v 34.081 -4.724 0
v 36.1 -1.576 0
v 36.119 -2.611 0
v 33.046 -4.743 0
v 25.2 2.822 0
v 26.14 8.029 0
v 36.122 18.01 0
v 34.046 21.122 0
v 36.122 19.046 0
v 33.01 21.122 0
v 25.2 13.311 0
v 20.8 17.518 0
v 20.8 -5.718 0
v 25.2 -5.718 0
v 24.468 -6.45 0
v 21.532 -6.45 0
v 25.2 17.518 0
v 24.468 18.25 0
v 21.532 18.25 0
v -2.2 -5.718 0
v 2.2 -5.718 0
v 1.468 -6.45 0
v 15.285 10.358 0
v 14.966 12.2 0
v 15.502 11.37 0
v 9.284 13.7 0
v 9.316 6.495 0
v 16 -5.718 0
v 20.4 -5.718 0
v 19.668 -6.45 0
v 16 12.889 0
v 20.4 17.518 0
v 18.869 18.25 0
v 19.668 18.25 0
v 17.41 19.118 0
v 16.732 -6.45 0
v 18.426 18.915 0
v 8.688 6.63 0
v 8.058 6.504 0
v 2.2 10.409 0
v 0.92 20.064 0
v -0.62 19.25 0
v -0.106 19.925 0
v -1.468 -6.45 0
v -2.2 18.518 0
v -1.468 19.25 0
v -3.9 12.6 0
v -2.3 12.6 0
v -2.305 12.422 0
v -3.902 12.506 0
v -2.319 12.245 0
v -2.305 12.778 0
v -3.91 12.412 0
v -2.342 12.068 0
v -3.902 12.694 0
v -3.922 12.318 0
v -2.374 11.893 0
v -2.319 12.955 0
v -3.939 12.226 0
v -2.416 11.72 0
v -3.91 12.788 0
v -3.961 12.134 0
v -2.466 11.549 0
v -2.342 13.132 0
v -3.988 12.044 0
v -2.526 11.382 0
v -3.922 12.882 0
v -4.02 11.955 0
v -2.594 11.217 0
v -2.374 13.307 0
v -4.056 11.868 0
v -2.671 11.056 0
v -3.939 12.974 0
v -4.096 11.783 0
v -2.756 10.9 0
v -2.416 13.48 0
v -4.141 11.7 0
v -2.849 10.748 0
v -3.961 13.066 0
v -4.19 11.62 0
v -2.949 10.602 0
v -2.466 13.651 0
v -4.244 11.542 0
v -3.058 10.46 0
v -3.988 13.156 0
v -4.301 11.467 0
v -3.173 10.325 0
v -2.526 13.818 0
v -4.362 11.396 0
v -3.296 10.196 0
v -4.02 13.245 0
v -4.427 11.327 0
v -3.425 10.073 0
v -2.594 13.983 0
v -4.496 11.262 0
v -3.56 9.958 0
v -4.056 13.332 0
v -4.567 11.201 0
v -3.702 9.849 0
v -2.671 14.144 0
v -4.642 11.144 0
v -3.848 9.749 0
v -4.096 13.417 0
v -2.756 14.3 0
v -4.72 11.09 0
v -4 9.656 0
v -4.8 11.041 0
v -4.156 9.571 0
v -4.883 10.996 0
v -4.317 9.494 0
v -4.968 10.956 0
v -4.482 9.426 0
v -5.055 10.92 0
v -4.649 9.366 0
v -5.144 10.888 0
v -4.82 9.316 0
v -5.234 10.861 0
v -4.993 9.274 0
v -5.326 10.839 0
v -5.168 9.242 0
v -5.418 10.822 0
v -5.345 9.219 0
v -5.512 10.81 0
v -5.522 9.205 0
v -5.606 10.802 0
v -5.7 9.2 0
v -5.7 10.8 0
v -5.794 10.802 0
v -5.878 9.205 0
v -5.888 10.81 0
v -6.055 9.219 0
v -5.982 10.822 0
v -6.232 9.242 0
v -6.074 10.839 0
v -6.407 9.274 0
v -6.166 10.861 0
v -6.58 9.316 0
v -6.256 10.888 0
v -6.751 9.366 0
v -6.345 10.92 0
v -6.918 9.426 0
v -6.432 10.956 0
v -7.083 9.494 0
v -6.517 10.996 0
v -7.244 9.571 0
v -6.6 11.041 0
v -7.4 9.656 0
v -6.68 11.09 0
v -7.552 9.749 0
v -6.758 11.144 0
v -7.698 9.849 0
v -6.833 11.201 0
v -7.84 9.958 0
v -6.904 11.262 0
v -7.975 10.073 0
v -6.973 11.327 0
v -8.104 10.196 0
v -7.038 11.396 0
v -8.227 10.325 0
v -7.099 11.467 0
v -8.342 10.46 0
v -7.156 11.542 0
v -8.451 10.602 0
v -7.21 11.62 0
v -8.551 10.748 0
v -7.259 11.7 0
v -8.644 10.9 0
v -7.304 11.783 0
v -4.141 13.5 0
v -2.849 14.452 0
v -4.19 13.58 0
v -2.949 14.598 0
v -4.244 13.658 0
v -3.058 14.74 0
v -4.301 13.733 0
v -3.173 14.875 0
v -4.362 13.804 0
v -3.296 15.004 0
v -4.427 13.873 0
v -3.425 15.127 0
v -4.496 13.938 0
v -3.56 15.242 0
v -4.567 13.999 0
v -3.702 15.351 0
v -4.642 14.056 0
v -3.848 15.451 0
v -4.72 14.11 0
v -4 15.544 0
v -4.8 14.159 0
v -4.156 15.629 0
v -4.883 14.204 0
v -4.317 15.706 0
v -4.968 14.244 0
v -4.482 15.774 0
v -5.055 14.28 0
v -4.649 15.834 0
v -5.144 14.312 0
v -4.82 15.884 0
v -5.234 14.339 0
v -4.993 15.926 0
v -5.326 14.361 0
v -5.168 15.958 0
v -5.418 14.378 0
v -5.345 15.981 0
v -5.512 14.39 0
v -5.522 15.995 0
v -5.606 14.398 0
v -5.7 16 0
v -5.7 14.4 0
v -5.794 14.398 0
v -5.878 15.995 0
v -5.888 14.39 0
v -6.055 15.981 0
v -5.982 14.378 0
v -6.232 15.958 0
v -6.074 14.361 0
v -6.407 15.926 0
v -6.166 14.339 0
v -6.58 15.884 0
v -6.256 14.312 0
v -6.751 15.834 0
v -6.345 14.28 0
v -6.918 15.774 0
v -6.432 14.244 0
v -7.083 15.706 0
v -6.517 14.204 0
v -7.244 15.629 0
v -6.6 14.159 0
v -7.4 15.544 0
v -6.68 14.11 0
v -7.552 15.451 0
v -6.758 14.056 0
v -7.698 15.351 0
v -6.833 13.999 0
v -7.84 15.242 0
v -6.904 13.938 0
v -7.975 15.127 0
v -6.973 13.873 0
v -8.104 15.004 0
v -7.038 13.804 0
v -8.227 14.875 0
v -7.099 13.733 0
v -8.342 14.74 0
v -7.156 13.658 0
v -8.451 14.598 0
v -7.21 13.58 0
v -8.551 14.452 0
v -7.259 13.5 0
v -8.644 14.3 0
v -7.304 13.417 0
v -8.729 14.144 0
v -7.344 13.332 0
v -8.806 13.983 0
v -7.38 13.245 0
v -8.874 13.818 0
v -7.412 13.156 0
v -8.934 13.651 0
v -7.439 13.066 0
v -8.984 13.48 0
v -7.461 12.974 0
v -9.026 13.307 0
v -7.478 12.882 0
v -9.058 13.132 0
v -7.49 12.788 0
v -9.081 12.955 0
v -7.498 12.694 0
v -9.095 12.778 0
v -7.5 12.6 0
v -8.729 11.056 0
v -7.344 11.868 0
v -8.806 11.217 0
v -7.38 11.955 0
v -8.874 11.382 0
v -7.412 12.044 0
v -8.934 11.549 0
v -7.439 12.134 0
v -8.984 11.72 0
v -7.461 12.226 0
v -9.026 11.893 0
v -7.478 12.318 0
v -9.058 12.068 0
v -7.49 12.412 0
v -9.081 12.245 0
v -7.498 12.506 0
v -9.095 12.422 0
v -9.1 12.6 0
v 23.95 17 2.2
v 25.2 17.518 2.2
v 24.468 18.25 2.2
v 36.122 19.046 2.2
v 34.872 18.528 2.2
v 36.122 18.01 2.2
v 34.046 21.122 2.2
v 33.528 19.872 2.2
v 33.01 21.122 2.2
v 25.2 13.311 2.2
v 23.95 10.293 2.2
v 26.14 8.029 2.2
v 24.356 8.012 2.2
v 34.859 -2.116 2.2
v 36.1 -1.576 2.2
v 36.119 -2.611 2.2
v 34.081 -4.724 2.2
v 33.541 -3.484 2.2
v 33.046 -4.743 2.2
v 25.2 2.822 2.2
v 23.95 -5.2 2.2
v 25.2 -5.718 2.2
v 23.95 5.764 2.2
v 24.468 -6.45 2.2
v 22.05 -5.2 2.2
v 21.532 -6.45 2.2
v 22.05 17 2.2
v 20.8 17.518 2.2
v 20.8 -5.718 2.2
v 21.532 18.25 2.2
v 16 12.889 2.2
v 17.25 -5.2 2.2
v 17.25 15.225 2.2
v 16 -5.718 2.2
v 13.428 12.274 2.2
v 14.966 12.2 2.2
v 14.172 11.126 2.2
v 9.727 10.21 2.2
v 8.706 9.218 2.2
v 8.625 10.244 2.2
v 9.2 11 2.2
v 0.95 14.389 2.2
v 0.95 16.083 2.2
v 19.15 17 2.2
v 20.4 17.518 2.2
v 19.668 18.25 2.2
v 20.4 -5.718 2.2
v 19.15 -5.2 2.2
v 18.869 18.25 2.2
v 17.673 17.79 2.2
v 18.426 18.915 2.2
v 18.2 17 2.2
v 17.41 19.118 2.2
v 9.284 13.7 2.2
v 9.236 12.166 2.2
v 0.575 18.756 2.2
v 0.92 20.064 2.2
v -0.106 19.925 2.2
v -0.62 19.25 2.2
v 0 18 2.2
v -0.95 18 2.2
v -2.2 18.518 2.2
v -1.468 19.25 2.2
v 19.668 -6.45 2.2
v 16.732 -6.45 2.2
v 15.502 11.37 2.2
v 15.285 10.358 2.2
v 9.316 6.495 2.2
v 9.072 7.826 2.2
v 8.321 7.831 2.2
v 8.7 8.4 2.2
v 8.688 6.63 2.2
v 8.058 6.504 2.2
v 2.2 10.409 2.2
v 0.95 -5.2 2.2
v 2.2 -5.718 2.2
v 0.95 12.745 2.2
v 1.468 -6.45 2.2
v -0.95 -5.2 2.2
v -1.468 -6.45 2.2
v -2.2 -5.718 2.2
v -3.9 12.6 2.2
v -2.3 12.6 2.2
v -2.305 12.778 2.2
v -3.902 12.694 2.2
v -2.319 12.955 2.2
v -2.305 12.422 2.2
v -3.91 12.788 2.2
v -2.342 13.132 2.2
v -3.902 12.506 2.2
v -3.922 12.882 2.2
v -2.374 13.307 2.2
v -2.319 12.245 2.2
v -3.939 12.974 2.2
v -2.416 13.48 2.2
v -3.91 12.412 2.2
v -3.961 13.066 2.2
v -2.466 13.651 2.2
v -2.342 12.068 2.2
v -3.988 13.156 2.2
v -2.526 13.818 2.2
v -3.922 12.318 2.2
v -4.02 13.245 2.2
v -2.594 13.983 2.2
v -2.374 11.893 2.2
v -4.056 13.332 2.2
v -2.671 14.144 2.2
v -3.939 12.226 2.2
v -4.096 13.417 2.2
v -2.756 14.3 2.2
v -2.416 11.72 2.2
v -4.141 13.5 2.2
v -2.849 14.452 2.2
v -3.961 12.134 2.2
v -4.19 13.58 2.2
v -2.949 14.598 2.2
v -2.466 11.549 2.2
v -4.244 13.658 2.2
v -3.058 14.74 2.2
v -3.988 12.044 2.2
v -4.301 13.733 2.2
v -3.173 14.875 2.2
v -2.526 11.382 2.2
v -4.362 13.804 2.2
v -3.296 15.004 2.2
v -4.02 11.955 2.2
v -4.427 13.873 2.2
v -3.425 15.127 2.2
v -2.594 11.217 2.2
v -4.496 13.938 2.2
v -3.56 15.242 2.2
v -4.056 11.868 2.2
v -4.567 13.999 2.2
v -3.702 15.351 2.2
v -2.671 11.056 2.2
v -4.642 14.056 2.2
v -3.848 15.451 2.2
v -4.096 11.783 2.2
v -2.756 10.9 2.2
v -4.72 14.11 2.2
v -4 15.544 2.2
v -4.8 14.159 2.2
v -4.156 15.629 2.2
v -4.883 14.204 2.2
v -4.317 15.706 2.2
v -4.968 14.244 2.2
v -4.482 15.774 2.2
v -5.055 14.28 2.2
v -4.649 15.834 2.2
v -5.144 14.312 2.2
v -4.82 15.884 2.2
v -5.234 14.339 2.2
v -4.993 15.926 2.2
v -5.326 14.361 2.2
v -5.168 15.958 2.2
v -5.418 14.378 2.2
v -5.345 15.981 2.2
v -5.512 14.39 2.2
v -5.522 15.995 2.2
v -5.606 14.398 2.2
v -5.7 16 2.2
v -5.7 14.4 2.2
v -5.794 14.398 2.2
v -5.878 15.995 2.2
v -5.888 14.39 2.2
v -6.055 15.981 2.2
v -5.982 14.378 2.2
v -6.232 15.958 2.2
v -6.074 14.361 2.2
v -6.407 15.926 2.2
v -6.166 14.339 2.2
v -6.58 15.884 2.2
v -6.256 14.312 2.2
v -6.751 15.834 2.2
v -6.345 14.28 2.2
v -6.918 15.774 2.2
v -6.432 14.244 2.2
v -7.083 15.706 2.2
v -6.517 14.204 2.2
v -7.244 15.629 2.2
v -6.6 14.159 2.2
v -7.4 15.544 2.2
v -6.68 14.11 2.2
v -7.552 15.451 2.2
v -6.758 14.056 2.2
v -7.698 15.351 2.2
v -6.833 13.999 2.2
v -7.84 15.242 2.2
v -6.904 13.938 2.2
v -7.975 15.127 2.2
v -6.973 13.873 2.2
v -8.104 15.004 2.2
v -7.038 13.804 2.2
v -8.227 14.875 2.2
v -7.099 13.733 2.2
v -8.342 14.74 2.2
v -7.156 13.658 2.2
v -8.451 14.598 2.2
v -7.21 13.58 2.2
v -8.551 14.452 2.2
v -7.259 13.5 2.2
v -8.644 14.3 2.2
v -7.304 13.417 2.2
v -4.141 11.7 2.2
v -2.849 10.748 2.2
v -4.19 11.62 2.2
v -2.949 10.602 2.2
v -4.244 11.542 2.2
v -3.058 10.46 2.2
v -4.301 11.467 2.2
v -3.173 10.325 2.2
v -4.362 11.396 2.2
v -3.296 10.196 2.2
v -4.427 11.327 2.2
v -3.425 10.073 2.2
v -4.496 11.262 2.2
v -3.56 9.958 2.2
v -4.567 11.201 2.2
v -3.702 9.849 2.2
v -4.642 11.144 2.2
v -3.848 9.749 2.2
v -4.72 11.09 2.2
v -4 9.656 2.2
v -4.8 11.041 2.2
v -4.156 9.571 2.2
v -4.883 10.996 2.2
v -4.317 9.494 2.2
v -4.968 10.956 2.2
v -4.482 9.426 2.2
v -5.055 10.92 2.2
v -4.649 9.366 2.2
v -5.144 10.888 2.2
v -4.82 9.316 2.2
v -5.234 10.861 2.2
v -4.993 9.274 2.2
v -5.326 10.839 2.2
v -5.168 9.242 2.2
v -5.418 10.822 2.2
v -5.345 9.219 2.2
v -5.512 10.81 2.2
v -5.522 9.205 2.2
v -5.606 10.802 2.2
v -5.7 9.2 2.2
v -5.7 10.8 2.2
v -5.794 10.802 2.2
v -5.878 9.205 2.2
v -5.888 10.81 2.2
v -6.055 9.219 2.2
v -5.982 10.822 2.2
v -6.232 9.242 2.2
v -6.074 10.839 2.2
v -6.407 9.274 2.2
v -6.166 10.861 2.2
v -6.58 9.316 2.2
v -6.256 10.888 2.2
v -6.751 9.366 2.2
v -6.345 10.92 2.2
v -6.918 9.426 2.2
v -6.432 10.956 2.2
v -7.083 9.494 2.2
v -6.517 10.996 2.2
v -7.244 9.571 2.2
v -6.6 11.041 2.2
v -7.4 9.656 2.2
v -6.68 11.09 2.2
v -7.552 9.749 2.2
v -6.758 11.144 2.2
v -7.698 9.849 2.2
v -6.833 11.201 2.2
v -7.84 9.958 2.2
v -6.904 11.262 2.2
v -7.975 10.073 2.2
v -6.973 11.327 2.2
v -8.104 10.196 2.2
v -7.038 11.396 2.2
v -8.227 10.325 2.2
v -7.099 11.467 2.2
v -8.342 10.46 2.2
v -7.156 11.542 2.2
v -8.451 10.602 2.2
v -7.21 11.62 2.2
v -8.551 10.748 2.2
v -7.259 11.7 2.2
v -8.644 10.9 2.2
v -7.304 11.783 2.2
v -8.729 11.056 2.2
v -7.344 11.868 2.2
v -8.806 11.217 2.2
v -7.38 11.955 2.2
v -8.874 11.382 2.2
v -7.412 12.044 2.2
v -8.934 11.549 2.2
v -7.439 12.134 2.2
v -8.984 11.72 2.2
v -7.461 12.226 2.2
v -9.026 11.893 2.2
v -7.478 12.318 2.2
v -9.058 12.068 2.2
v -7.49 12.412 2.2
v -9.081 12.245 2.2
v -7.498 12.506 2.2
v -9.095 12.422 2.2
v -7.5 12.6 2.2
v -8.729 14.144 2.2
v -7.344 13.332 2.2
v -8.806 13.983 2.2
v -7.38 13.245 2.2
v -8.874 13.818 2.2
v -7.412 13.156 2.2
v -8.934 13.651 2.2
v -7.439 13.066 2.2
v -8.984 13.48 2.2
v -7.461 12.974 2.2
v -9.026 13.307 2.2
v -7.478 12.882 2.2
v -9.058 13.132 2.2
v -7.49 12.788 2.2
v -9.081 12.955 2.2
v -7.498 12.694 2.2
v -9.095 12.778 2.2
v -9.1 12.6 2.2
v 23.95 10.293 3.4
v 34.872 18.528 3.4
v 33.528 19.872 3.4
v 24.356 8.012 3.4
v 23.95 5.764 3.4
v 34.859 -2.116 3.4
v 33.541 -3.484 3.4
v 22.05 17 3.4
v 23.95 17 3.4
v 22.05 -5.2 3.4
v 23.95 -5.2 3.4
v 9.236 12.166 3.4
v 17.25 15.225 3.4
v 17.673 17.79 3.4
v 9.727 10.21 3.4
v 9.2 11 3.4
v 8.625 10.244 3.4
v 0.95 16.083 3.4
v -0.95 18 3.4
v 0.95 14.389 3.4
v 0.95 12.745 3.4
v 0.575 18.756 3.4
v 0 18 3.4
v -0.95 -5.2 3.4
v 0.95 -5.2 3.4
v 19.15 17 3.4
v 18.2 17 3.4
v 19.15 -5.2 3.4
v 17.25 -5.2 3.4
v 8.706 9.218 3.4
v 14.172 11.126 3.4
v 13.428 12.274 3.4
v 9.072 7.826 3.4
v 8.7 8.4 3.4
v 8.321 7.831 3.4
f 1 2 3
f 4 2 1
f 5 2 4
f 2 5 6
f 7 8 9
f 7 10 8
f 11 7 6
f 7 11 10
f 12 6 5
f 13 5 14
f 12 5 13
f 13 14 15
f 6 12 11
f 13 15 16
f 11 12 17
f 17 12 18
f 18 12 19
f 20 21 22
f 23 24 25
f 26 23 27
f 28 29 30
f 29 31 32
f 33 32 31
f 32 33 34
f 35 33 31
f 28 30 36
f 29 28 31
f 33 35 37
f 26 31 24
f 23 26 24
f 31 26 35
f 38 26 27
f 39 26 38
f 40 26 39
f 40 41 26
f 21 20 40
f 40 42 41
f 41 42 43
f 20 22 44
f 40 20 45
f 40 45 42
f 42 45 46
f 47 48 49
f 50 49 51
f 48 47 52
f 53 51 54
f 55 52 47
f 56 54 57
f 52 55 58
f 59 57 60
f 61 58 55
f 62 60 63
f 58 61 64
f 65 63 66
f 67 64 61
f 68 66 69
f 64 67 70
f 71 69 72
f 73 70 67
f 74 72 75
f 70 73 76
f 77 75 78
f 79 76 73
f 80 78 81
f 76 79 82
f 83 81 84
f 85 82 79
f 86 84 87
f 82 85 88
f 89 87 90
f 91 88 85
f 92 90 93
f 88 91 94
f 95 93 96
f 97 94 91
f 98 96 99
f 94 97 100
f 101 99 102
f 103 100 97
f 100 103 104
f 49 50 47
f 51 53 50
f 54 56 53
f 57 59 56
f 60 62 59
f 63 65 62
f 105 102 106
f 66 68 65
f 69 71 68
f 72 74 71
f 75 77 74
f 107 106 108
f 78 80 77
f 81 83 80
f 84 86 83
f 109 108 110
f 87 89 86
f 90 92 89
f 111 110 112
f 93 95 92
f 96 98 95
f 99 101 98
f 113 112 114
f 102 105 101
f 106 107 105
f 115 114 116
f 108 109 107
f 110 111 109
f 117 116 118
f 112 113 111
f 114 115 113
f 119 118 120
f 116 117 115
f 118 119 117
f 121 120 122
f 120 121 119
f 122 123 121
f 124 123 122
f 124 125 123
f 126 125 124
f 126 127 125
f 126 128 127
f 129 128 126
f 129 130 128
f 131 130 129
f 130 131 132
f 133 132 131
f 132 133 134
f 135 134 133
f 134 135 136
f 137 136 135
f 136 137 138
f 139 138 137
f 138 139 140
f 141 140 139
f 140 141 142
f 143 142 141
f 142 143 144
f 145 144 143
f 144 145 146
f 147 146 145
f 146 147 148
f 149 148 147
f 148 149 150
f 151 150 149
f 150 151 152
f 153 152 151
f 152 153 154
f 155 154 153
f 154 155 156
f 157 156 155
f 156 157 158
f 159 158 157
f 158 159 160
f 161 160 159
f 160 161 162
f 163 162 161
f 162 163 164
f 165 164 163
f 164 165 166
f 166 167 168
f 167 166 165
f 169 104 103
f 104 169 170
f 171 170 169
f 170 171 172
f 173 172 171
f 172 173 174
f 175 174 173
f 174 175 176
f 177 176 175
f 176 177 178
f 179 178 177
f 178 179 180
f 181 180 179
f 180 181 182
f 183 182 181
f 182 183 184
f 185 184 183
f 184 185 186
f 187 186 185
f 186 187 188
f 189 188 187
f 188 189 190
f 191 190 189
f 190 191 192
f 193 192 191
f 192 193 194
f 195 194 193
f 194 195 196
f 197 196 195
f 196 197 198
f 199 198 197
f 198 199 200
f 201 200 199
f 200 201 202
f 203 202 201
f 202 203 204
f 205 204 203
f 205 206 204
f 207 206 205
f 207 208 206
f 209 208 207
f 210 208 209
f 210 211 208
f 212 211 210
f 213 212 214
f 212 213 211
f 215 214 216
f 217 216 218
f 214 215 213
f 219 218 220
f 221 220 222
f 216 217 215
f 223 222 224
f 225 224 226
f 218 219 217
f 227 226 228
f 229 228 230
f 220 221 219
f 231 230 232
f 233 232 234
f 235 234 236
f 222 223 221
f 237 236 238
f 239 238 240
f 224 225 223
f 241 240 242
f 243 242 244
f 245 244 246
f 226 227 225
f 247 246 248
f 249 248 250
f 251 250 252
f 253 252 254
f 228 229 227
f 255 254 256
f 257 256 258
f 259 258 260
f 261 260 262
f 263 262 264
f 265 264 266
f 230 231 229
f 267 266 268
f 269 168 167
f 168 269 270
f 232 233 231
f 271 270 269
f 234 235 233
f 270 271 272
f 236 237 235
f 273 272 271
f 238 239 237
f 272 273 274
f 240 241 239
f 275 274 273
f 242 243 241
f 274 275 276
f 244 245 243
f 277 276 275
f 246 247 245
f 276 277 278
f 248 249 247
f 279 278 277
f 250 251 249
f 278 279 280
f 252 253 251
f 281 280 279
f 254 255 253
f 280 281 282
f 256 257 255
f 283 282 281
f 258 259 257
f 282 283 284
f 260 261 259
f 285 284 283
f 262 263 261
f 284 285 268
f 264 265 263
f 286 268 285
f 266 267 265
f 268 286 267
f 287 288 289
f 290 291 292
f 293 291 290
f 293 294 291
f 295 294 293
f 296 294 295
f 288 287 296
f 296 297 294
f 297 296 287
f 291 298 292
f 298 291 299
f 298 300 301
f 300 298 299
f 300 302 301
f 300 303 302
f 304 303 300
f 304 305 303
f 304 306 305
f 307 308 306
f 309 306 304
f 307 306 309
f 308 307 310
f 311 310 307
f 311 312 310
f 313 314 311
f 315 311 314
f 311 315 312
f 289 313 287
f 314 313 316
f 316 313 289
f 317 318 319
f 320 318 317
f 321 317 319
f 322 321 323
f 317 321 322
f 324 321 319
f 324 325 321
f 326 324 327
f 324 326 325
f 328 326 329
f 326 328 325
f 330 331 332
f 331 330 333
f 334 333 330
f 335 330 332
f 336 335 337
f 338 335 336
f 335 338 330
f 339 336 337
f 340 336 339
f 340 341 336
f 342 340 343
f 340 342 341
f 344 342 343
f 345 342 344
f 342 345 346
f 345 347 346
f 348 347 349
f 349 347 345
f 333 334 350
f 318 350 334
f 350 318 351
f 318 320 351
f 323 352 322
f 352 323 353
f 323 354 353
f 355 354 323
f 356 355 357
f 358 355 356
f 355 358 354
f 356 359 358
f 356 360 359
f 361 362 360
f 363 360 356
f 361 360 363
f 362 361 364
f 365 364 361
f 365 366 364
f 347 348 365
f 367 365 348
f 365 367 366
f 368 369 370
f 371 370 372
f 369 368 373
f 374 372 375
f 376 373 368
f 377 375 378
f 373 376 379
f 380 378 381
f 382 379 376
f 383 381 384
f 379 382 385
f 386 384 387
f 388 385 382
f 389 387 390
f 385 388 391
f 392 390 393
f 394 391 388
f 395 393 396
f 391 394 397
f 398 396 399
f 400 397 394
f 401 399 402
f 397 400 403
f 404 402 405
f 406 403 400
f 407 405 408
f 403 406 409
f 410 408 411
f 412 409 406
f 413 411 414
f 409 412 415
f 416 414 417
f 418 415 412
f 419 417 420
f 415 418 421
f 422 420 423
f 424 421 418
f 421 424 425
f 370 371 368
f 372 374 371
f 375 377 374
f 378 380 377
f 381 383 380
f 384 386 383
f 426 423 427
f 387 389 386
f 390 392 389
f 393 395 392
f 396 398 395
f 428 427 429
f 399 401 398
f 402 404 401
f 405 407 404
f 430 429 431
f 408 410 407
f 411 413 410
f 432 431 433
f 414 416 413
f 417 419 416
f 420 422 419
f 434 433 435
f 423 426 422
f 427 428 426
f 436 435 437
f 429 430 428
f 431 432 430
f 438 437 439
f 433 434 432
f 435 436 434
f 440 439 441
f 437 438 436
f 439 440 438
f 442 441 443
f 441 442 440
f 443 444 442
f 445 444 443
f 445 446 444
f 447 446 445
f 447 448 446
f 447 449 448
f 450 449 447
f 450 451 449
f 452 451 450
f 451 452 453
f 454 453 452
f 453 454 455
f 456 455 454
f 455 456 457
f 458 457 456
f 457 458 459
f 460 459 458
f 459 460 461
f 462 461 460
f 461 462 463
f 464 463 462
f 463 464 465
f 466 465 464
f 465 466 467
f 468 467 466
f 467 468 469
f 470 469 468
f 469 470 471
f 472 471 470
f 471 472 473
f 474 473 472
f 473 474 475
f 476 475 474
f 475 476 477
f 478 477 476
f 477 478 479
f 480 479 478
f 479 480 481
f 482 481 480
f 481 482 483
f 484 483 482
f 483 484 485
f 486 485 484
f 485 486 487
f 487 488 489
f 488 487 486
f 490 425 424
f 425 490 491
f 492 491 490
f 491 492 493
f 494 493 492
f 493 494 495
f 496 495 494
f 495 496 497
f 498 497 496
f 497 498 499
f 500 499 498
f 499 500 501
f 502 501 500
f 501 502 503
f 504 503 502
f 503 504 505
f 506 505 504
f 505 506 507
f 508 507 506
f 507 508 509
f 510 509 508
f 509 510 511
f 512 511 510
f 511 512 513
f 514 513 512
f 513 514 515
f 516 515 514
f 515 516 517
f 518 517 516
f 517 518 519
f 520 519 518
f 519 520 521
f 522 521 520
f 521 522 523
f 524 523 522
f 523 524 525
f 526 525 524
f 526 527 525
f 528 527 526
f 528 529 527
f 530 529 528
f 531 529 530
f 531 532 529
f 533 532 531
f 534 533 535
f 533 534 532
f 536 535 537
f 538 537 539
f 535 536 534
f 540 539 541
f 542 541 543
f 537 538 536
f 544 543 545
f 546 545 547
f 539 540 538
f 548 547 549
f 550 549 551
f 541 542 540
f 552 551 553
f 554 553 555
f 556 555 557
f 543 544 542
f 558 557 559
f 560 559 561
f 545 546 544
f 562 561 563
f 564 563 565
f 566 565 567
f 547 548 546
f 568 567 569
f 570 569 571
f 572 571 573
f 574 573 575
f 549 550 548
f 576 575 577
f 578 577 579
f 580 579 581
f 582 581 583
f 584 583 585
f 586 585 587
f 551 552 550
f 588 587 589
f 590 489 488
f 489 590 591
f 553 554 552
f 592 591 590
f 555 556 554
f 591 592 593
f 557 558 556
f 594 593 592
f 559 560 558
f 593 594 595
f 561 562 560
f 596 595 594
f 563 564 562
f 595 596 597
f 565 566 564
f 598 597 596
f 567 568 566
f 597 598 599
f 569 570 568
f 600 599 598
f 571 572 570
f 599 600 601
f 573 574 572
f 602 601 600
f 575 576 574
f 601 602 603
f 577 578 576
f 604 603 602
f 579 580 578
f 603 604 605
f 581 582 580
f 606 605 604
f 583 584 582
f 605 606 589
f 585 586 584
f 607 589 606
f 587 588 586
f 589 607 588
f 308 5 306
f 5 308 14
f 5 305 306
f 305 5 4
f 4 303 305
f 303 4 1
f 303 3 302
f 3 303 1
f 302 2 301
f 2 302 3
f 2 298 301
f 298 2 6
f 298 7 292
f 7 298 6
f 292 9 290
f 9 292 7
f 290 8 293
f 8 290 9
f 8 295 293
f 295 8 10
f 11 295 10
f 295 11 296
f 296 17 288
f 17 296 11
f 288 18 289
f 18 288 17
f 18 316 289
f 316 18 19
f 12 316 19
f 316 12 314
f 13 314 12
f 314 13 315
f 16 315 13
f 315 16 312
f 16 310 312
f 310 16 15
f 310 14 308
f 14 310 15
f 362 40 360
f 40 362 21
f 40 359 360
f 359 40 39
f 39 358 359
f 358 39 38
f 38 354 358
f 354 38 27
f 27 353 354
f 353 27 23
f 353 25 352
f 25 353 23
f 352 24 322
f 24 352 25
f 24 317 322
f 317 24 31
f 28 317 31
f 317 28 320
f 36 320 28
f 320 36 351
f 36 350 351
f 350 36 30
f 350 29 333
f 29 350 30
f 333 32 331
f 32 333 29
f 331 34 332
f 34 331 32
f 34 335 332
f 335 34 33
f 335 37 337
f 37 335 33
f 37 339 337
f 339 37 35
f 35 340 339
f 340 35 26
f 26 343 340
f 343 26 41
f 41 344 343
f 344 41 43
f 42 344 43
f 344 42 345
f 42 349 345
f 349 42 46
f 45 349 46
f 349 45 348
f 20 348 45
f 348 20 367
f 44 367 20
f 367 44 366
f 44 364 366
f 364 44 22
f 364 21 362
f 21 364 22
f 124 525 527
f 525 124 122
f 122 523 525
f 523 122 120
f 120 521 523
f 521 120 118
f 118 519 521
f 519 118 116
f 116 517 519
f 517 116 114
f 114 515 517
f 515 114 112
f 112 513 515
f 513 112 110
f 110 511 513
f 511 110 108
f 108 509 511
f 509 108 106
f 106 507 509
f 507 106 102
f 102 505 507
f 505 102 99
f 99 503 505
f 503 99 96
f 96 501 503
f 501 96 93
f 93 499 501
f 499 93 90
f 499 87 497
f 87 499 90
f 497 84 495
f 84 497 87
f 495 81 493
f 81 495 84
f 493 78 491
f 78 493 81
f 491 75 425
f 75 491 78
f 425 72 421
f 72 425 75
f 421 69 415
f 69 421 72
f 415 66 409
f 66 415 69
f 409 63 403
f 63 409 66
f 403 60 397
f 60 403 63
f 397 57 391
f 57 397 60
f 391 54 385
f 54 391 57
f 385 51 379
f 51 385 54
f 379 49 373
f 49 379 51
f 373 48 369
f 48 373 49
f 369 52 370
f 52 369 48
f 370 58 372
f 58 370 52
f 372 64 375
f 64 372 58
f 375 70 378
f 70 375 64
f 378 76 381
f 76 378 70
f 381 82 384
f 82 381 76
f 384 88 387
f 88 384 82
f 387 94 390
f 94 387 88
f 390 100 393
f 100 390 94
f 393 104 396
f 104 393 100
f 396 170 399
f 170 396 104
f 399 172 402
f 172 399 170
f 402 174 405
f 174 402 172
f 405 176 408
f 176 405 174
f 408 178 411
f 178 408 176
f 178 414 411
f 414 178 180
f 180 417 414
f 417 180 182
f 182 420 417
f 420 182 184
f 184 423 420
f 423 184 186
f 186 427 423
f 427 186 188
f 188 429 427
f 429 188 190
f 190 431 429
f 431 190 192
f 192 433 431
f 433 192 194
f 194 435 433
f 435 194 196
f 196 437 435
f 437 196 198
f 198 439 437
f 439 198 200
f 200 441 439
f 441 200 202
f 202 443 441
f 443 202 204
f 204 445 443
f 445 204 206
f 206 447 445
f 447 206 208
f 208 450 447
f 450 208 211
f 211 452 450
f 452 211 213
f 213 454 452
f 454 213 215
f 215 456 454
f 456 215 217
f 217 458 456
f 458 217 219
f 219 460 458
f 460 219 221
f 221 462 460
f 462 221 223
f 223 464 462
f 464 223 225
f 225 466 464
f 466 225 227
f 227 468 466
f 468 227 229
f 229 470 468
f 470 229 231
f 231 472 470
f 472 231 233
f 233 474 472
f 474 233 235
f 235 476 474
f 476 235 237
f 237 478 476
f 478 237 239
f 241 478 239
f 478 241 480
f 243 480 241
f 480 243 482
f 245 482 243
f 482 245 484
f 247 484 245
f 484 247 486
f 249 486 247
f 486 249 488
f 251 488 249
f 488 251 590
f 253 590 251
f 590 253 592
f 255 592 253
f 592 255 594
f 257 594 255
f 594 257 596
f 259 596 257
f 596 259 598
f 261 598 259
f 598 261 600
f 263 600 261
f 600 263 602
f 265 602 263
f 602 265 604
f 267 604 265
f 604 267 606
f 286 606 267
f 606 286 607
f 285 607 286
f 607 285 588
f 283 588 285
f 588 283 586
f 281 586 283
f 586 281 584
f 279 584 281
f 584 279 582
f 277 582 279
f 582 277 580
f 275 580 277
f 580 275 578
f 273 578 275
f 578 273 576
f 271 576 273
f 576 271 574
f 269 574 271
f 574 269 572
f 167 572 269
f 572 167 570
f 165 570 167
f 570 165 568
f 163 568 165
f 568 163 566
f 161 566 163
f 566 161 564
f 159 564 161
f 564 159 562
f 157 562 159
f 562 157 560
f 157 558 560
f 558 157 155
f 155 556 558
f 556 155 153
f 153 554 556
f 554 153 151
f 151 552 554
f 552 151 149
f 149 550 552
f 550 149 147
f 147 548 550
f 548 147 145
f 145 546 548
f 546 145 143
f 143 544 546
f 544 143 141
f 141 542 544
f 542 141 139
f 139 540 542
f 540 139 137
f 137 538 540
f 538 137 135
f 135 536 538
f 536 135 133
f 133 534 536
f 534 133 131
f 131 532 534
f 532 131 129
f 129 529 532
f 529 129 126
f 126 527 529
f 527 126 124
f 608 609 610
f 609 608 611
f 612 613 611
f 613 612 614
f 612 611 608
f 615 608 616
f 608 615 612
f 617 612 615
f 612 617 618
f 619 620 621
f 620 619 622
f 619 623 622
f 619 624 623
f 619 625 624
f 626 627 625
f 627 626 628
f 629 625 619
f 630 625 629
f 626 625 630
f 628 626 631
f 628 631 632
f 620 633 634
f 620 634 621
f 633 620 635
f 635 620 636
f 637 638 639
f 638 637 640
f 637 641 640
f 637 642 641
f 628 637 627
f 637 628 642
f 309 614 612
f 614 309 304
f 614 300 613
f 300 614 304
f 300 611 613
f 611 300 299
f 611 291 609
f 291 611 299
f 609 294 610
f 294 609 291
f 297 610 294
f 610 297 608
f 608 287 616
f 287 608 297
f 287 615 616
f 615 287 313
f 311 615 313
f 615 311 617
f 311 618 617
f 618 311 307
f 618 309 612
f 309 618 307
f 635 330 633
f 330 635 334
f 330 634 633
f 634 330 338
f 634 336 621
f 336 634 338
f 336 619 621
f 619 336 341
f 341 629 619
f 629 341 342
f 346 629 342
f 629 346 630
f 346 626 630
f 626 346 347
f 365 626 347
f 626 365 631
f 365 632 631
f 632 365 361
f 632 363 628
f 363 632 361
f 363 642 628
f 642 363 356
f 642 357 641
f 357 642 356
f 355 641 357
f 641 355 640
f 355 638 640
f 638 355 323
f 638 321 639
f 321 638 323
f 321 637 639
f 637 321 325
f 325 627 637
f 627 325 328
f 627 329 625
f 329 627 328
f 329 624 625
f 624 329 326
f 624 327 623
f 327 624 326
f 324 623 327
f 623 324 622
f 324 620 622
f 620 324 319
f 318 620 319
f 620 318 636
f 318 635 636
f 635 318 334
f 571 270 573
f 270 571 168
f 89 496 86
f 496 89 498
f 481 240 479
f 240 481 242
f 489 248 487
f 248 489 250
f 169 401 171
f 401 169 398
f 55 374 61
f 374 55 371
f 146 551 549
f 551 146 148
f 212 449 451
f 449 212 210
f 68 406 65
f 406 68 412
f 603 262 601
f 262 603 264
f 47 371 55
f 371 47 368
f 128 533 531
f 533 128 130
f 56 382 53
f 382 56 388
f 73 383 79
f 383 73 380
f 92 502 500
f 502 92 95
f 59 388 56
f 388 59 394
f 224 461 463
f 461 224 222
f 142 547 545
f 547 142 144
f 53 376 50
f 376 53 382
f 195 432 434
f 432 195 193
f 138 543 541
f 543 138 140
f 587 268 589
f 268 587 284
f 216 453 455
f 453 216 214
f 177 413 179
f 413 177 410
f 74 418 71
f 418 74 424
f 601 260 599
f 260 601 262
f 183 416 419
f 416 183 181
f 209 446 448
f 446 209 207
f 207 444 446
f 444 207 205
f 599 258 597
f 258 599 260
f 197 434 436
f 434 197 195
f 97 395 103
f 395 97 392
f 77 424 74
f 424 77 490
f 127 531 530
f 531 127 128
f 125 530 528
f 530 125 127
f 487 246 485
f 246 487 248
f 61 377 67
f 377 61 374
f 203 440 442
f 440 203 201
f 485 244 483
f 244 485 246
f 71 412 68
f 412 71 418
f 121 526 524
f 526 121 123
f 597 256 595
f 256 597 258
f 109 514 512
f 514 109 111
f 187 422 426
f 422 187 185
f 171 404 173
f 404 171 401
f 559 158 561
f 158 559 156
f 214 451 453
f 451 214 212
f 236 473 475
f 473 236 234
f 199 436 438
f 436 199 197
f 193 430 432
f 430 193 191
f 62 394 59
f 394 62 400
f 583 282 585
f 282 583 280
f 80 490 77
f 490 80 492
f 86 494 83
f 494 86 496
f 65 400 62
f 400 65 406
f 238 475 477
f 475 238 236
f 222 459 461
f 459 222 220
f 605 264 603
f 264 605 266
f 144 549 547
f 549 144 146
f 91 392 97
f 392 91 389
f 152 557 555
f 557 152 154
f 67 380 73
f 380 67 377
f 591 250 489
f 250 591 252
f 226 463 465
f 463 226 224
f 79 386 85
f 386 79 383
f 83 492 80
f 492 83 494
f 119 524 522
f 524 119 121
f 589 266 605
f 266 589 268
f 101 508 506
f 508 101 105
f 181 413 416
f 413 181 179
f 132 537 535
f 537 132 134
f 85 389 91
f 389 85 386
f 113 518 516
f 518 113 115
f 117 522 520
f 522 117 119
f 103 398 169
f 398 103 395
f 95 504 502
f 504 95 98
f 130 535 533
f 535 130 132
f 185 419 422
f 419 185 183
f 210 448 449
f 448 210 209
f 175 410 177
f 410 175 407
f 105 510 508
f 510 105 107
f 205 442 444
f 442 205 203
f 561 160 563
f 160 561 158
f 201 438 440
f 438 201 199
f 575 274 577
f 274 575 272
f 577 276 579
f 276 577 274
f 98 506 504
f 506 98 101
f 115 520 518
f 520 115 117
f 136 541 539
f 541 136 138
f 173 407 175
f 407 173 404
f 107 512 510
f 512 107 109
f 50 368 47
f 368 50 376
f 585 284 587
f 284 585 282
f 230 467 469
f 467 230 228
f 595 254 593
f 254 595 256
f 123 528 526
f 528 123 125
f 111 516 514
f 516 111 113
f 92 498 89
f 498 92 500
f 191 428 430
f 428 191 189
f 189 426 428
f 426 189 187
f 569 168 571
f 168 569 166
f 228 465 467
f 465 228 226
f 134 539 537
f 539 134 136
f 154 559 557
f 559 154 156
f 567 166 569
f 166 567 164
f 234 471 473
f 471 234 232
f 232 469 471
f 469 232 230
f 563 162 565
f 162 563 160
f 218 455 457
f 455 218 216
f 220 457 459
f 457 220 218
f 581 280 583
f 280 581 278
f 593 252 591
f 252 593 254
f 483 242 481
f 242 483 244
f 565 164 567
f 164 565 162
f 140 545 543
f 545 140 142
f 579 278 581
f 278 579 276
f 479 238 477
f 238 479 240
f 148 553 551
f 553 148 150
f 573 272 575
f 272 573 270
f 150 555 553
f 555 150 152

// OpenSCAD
$fn = 120;

// =====================
// COLOR VARIABLES
// =====================
base_color = [0, 0, 0];   // Black base
logo_color = [1, 1, 1];   // White raised logo

// =====================
// PARAMETERS
// =====================
base_thickness = 2.2;      // Main body thickness
logo_raise     = 1.2;      // Raised MK thickness
stroke_w       = 1.9;      // Logo stroke width
padding        = 1.25;     // Tight border around logo

ring_outer_d   = 6.8;
ring_inner_d   = 3.6;
ring_center    = [-5.7, 12.6];  // Ring moved up-left, less intrusive

// =====================
// HELPERS
// =====================
module bar(p1, p2, w) {
    dx = p2[0] - p1[0];
    dy = p2[1] - p1[1];
    len = sqrt(dx * dx + dy * dy);
    ang = atan2(dy, dx);

    translate([(p1[0] + p2[0]) / 2, (p1[1] + p2[1]) / 2])
        rotate(ang)
            square([len, w], center = true);
}

// Angular MK logo (2D)
module mk_logo_2d(w = stroke_w) {
    union() {
        // M (closer to reference proportions)
        bar([0, 0],   [0, 18],   w);   // left vertical
        bar([0, 18],  [9.2, 11], w);   // first down stroke
        bar([9.2, 11],[18.2, 17],w);   // second up stroke
        bar([18.2, 17],[18.2, 8],w);   // short right vertical of M

        // M inner double line
        bar([0, 14.2],  [8.7, 8.4],  w * 0.72);
        bar([8.7, 8.4], [13.8, 11.7], w * 0.72);

        // Lower legs like logo style
        bar([0, 0],   [0, -5.2],   w);
        bar([18.2, 8],[18.2, -5.2],w);

        // K
        bar([23.0, -5.2], [23.0, 17.0], w);
        bar([23.0, 8.0],  [34.2, 19.2], w);
        bar([23.0, 8.0],  [34.2, -2.8], w);
    }
}

// Base profile + ring tab (2D)
module keychain_base_2d() {
    union() {
        // Chamfered offset keeps sharp edges (no rounded blob look)
        offset(delta = padding, chamfer = true) mk_logo_2d();
        translate(ring_center) circle(d = ring_outer_d);
    }
}

// =====================
// FINAL MODEL
// =====================
difference() {
    union() {
        // Black base (background)
        color(base_color)
        linear_extrude(height = base_thickness)
            keychain_base_2d();

        // White raised logo on top
        color(logo_color)
        translate([0, 0, base_thickness])
            linear_extrude(height = logo_raise)
                mk_logo_2d();
    }

    // Keyring hole through full thickness
    translate([ring_center[0], ring_center[1], -0.1])
        cylinder(h = base_thickness + logo_raise + 0.2, d = ring_inner_d);
}
